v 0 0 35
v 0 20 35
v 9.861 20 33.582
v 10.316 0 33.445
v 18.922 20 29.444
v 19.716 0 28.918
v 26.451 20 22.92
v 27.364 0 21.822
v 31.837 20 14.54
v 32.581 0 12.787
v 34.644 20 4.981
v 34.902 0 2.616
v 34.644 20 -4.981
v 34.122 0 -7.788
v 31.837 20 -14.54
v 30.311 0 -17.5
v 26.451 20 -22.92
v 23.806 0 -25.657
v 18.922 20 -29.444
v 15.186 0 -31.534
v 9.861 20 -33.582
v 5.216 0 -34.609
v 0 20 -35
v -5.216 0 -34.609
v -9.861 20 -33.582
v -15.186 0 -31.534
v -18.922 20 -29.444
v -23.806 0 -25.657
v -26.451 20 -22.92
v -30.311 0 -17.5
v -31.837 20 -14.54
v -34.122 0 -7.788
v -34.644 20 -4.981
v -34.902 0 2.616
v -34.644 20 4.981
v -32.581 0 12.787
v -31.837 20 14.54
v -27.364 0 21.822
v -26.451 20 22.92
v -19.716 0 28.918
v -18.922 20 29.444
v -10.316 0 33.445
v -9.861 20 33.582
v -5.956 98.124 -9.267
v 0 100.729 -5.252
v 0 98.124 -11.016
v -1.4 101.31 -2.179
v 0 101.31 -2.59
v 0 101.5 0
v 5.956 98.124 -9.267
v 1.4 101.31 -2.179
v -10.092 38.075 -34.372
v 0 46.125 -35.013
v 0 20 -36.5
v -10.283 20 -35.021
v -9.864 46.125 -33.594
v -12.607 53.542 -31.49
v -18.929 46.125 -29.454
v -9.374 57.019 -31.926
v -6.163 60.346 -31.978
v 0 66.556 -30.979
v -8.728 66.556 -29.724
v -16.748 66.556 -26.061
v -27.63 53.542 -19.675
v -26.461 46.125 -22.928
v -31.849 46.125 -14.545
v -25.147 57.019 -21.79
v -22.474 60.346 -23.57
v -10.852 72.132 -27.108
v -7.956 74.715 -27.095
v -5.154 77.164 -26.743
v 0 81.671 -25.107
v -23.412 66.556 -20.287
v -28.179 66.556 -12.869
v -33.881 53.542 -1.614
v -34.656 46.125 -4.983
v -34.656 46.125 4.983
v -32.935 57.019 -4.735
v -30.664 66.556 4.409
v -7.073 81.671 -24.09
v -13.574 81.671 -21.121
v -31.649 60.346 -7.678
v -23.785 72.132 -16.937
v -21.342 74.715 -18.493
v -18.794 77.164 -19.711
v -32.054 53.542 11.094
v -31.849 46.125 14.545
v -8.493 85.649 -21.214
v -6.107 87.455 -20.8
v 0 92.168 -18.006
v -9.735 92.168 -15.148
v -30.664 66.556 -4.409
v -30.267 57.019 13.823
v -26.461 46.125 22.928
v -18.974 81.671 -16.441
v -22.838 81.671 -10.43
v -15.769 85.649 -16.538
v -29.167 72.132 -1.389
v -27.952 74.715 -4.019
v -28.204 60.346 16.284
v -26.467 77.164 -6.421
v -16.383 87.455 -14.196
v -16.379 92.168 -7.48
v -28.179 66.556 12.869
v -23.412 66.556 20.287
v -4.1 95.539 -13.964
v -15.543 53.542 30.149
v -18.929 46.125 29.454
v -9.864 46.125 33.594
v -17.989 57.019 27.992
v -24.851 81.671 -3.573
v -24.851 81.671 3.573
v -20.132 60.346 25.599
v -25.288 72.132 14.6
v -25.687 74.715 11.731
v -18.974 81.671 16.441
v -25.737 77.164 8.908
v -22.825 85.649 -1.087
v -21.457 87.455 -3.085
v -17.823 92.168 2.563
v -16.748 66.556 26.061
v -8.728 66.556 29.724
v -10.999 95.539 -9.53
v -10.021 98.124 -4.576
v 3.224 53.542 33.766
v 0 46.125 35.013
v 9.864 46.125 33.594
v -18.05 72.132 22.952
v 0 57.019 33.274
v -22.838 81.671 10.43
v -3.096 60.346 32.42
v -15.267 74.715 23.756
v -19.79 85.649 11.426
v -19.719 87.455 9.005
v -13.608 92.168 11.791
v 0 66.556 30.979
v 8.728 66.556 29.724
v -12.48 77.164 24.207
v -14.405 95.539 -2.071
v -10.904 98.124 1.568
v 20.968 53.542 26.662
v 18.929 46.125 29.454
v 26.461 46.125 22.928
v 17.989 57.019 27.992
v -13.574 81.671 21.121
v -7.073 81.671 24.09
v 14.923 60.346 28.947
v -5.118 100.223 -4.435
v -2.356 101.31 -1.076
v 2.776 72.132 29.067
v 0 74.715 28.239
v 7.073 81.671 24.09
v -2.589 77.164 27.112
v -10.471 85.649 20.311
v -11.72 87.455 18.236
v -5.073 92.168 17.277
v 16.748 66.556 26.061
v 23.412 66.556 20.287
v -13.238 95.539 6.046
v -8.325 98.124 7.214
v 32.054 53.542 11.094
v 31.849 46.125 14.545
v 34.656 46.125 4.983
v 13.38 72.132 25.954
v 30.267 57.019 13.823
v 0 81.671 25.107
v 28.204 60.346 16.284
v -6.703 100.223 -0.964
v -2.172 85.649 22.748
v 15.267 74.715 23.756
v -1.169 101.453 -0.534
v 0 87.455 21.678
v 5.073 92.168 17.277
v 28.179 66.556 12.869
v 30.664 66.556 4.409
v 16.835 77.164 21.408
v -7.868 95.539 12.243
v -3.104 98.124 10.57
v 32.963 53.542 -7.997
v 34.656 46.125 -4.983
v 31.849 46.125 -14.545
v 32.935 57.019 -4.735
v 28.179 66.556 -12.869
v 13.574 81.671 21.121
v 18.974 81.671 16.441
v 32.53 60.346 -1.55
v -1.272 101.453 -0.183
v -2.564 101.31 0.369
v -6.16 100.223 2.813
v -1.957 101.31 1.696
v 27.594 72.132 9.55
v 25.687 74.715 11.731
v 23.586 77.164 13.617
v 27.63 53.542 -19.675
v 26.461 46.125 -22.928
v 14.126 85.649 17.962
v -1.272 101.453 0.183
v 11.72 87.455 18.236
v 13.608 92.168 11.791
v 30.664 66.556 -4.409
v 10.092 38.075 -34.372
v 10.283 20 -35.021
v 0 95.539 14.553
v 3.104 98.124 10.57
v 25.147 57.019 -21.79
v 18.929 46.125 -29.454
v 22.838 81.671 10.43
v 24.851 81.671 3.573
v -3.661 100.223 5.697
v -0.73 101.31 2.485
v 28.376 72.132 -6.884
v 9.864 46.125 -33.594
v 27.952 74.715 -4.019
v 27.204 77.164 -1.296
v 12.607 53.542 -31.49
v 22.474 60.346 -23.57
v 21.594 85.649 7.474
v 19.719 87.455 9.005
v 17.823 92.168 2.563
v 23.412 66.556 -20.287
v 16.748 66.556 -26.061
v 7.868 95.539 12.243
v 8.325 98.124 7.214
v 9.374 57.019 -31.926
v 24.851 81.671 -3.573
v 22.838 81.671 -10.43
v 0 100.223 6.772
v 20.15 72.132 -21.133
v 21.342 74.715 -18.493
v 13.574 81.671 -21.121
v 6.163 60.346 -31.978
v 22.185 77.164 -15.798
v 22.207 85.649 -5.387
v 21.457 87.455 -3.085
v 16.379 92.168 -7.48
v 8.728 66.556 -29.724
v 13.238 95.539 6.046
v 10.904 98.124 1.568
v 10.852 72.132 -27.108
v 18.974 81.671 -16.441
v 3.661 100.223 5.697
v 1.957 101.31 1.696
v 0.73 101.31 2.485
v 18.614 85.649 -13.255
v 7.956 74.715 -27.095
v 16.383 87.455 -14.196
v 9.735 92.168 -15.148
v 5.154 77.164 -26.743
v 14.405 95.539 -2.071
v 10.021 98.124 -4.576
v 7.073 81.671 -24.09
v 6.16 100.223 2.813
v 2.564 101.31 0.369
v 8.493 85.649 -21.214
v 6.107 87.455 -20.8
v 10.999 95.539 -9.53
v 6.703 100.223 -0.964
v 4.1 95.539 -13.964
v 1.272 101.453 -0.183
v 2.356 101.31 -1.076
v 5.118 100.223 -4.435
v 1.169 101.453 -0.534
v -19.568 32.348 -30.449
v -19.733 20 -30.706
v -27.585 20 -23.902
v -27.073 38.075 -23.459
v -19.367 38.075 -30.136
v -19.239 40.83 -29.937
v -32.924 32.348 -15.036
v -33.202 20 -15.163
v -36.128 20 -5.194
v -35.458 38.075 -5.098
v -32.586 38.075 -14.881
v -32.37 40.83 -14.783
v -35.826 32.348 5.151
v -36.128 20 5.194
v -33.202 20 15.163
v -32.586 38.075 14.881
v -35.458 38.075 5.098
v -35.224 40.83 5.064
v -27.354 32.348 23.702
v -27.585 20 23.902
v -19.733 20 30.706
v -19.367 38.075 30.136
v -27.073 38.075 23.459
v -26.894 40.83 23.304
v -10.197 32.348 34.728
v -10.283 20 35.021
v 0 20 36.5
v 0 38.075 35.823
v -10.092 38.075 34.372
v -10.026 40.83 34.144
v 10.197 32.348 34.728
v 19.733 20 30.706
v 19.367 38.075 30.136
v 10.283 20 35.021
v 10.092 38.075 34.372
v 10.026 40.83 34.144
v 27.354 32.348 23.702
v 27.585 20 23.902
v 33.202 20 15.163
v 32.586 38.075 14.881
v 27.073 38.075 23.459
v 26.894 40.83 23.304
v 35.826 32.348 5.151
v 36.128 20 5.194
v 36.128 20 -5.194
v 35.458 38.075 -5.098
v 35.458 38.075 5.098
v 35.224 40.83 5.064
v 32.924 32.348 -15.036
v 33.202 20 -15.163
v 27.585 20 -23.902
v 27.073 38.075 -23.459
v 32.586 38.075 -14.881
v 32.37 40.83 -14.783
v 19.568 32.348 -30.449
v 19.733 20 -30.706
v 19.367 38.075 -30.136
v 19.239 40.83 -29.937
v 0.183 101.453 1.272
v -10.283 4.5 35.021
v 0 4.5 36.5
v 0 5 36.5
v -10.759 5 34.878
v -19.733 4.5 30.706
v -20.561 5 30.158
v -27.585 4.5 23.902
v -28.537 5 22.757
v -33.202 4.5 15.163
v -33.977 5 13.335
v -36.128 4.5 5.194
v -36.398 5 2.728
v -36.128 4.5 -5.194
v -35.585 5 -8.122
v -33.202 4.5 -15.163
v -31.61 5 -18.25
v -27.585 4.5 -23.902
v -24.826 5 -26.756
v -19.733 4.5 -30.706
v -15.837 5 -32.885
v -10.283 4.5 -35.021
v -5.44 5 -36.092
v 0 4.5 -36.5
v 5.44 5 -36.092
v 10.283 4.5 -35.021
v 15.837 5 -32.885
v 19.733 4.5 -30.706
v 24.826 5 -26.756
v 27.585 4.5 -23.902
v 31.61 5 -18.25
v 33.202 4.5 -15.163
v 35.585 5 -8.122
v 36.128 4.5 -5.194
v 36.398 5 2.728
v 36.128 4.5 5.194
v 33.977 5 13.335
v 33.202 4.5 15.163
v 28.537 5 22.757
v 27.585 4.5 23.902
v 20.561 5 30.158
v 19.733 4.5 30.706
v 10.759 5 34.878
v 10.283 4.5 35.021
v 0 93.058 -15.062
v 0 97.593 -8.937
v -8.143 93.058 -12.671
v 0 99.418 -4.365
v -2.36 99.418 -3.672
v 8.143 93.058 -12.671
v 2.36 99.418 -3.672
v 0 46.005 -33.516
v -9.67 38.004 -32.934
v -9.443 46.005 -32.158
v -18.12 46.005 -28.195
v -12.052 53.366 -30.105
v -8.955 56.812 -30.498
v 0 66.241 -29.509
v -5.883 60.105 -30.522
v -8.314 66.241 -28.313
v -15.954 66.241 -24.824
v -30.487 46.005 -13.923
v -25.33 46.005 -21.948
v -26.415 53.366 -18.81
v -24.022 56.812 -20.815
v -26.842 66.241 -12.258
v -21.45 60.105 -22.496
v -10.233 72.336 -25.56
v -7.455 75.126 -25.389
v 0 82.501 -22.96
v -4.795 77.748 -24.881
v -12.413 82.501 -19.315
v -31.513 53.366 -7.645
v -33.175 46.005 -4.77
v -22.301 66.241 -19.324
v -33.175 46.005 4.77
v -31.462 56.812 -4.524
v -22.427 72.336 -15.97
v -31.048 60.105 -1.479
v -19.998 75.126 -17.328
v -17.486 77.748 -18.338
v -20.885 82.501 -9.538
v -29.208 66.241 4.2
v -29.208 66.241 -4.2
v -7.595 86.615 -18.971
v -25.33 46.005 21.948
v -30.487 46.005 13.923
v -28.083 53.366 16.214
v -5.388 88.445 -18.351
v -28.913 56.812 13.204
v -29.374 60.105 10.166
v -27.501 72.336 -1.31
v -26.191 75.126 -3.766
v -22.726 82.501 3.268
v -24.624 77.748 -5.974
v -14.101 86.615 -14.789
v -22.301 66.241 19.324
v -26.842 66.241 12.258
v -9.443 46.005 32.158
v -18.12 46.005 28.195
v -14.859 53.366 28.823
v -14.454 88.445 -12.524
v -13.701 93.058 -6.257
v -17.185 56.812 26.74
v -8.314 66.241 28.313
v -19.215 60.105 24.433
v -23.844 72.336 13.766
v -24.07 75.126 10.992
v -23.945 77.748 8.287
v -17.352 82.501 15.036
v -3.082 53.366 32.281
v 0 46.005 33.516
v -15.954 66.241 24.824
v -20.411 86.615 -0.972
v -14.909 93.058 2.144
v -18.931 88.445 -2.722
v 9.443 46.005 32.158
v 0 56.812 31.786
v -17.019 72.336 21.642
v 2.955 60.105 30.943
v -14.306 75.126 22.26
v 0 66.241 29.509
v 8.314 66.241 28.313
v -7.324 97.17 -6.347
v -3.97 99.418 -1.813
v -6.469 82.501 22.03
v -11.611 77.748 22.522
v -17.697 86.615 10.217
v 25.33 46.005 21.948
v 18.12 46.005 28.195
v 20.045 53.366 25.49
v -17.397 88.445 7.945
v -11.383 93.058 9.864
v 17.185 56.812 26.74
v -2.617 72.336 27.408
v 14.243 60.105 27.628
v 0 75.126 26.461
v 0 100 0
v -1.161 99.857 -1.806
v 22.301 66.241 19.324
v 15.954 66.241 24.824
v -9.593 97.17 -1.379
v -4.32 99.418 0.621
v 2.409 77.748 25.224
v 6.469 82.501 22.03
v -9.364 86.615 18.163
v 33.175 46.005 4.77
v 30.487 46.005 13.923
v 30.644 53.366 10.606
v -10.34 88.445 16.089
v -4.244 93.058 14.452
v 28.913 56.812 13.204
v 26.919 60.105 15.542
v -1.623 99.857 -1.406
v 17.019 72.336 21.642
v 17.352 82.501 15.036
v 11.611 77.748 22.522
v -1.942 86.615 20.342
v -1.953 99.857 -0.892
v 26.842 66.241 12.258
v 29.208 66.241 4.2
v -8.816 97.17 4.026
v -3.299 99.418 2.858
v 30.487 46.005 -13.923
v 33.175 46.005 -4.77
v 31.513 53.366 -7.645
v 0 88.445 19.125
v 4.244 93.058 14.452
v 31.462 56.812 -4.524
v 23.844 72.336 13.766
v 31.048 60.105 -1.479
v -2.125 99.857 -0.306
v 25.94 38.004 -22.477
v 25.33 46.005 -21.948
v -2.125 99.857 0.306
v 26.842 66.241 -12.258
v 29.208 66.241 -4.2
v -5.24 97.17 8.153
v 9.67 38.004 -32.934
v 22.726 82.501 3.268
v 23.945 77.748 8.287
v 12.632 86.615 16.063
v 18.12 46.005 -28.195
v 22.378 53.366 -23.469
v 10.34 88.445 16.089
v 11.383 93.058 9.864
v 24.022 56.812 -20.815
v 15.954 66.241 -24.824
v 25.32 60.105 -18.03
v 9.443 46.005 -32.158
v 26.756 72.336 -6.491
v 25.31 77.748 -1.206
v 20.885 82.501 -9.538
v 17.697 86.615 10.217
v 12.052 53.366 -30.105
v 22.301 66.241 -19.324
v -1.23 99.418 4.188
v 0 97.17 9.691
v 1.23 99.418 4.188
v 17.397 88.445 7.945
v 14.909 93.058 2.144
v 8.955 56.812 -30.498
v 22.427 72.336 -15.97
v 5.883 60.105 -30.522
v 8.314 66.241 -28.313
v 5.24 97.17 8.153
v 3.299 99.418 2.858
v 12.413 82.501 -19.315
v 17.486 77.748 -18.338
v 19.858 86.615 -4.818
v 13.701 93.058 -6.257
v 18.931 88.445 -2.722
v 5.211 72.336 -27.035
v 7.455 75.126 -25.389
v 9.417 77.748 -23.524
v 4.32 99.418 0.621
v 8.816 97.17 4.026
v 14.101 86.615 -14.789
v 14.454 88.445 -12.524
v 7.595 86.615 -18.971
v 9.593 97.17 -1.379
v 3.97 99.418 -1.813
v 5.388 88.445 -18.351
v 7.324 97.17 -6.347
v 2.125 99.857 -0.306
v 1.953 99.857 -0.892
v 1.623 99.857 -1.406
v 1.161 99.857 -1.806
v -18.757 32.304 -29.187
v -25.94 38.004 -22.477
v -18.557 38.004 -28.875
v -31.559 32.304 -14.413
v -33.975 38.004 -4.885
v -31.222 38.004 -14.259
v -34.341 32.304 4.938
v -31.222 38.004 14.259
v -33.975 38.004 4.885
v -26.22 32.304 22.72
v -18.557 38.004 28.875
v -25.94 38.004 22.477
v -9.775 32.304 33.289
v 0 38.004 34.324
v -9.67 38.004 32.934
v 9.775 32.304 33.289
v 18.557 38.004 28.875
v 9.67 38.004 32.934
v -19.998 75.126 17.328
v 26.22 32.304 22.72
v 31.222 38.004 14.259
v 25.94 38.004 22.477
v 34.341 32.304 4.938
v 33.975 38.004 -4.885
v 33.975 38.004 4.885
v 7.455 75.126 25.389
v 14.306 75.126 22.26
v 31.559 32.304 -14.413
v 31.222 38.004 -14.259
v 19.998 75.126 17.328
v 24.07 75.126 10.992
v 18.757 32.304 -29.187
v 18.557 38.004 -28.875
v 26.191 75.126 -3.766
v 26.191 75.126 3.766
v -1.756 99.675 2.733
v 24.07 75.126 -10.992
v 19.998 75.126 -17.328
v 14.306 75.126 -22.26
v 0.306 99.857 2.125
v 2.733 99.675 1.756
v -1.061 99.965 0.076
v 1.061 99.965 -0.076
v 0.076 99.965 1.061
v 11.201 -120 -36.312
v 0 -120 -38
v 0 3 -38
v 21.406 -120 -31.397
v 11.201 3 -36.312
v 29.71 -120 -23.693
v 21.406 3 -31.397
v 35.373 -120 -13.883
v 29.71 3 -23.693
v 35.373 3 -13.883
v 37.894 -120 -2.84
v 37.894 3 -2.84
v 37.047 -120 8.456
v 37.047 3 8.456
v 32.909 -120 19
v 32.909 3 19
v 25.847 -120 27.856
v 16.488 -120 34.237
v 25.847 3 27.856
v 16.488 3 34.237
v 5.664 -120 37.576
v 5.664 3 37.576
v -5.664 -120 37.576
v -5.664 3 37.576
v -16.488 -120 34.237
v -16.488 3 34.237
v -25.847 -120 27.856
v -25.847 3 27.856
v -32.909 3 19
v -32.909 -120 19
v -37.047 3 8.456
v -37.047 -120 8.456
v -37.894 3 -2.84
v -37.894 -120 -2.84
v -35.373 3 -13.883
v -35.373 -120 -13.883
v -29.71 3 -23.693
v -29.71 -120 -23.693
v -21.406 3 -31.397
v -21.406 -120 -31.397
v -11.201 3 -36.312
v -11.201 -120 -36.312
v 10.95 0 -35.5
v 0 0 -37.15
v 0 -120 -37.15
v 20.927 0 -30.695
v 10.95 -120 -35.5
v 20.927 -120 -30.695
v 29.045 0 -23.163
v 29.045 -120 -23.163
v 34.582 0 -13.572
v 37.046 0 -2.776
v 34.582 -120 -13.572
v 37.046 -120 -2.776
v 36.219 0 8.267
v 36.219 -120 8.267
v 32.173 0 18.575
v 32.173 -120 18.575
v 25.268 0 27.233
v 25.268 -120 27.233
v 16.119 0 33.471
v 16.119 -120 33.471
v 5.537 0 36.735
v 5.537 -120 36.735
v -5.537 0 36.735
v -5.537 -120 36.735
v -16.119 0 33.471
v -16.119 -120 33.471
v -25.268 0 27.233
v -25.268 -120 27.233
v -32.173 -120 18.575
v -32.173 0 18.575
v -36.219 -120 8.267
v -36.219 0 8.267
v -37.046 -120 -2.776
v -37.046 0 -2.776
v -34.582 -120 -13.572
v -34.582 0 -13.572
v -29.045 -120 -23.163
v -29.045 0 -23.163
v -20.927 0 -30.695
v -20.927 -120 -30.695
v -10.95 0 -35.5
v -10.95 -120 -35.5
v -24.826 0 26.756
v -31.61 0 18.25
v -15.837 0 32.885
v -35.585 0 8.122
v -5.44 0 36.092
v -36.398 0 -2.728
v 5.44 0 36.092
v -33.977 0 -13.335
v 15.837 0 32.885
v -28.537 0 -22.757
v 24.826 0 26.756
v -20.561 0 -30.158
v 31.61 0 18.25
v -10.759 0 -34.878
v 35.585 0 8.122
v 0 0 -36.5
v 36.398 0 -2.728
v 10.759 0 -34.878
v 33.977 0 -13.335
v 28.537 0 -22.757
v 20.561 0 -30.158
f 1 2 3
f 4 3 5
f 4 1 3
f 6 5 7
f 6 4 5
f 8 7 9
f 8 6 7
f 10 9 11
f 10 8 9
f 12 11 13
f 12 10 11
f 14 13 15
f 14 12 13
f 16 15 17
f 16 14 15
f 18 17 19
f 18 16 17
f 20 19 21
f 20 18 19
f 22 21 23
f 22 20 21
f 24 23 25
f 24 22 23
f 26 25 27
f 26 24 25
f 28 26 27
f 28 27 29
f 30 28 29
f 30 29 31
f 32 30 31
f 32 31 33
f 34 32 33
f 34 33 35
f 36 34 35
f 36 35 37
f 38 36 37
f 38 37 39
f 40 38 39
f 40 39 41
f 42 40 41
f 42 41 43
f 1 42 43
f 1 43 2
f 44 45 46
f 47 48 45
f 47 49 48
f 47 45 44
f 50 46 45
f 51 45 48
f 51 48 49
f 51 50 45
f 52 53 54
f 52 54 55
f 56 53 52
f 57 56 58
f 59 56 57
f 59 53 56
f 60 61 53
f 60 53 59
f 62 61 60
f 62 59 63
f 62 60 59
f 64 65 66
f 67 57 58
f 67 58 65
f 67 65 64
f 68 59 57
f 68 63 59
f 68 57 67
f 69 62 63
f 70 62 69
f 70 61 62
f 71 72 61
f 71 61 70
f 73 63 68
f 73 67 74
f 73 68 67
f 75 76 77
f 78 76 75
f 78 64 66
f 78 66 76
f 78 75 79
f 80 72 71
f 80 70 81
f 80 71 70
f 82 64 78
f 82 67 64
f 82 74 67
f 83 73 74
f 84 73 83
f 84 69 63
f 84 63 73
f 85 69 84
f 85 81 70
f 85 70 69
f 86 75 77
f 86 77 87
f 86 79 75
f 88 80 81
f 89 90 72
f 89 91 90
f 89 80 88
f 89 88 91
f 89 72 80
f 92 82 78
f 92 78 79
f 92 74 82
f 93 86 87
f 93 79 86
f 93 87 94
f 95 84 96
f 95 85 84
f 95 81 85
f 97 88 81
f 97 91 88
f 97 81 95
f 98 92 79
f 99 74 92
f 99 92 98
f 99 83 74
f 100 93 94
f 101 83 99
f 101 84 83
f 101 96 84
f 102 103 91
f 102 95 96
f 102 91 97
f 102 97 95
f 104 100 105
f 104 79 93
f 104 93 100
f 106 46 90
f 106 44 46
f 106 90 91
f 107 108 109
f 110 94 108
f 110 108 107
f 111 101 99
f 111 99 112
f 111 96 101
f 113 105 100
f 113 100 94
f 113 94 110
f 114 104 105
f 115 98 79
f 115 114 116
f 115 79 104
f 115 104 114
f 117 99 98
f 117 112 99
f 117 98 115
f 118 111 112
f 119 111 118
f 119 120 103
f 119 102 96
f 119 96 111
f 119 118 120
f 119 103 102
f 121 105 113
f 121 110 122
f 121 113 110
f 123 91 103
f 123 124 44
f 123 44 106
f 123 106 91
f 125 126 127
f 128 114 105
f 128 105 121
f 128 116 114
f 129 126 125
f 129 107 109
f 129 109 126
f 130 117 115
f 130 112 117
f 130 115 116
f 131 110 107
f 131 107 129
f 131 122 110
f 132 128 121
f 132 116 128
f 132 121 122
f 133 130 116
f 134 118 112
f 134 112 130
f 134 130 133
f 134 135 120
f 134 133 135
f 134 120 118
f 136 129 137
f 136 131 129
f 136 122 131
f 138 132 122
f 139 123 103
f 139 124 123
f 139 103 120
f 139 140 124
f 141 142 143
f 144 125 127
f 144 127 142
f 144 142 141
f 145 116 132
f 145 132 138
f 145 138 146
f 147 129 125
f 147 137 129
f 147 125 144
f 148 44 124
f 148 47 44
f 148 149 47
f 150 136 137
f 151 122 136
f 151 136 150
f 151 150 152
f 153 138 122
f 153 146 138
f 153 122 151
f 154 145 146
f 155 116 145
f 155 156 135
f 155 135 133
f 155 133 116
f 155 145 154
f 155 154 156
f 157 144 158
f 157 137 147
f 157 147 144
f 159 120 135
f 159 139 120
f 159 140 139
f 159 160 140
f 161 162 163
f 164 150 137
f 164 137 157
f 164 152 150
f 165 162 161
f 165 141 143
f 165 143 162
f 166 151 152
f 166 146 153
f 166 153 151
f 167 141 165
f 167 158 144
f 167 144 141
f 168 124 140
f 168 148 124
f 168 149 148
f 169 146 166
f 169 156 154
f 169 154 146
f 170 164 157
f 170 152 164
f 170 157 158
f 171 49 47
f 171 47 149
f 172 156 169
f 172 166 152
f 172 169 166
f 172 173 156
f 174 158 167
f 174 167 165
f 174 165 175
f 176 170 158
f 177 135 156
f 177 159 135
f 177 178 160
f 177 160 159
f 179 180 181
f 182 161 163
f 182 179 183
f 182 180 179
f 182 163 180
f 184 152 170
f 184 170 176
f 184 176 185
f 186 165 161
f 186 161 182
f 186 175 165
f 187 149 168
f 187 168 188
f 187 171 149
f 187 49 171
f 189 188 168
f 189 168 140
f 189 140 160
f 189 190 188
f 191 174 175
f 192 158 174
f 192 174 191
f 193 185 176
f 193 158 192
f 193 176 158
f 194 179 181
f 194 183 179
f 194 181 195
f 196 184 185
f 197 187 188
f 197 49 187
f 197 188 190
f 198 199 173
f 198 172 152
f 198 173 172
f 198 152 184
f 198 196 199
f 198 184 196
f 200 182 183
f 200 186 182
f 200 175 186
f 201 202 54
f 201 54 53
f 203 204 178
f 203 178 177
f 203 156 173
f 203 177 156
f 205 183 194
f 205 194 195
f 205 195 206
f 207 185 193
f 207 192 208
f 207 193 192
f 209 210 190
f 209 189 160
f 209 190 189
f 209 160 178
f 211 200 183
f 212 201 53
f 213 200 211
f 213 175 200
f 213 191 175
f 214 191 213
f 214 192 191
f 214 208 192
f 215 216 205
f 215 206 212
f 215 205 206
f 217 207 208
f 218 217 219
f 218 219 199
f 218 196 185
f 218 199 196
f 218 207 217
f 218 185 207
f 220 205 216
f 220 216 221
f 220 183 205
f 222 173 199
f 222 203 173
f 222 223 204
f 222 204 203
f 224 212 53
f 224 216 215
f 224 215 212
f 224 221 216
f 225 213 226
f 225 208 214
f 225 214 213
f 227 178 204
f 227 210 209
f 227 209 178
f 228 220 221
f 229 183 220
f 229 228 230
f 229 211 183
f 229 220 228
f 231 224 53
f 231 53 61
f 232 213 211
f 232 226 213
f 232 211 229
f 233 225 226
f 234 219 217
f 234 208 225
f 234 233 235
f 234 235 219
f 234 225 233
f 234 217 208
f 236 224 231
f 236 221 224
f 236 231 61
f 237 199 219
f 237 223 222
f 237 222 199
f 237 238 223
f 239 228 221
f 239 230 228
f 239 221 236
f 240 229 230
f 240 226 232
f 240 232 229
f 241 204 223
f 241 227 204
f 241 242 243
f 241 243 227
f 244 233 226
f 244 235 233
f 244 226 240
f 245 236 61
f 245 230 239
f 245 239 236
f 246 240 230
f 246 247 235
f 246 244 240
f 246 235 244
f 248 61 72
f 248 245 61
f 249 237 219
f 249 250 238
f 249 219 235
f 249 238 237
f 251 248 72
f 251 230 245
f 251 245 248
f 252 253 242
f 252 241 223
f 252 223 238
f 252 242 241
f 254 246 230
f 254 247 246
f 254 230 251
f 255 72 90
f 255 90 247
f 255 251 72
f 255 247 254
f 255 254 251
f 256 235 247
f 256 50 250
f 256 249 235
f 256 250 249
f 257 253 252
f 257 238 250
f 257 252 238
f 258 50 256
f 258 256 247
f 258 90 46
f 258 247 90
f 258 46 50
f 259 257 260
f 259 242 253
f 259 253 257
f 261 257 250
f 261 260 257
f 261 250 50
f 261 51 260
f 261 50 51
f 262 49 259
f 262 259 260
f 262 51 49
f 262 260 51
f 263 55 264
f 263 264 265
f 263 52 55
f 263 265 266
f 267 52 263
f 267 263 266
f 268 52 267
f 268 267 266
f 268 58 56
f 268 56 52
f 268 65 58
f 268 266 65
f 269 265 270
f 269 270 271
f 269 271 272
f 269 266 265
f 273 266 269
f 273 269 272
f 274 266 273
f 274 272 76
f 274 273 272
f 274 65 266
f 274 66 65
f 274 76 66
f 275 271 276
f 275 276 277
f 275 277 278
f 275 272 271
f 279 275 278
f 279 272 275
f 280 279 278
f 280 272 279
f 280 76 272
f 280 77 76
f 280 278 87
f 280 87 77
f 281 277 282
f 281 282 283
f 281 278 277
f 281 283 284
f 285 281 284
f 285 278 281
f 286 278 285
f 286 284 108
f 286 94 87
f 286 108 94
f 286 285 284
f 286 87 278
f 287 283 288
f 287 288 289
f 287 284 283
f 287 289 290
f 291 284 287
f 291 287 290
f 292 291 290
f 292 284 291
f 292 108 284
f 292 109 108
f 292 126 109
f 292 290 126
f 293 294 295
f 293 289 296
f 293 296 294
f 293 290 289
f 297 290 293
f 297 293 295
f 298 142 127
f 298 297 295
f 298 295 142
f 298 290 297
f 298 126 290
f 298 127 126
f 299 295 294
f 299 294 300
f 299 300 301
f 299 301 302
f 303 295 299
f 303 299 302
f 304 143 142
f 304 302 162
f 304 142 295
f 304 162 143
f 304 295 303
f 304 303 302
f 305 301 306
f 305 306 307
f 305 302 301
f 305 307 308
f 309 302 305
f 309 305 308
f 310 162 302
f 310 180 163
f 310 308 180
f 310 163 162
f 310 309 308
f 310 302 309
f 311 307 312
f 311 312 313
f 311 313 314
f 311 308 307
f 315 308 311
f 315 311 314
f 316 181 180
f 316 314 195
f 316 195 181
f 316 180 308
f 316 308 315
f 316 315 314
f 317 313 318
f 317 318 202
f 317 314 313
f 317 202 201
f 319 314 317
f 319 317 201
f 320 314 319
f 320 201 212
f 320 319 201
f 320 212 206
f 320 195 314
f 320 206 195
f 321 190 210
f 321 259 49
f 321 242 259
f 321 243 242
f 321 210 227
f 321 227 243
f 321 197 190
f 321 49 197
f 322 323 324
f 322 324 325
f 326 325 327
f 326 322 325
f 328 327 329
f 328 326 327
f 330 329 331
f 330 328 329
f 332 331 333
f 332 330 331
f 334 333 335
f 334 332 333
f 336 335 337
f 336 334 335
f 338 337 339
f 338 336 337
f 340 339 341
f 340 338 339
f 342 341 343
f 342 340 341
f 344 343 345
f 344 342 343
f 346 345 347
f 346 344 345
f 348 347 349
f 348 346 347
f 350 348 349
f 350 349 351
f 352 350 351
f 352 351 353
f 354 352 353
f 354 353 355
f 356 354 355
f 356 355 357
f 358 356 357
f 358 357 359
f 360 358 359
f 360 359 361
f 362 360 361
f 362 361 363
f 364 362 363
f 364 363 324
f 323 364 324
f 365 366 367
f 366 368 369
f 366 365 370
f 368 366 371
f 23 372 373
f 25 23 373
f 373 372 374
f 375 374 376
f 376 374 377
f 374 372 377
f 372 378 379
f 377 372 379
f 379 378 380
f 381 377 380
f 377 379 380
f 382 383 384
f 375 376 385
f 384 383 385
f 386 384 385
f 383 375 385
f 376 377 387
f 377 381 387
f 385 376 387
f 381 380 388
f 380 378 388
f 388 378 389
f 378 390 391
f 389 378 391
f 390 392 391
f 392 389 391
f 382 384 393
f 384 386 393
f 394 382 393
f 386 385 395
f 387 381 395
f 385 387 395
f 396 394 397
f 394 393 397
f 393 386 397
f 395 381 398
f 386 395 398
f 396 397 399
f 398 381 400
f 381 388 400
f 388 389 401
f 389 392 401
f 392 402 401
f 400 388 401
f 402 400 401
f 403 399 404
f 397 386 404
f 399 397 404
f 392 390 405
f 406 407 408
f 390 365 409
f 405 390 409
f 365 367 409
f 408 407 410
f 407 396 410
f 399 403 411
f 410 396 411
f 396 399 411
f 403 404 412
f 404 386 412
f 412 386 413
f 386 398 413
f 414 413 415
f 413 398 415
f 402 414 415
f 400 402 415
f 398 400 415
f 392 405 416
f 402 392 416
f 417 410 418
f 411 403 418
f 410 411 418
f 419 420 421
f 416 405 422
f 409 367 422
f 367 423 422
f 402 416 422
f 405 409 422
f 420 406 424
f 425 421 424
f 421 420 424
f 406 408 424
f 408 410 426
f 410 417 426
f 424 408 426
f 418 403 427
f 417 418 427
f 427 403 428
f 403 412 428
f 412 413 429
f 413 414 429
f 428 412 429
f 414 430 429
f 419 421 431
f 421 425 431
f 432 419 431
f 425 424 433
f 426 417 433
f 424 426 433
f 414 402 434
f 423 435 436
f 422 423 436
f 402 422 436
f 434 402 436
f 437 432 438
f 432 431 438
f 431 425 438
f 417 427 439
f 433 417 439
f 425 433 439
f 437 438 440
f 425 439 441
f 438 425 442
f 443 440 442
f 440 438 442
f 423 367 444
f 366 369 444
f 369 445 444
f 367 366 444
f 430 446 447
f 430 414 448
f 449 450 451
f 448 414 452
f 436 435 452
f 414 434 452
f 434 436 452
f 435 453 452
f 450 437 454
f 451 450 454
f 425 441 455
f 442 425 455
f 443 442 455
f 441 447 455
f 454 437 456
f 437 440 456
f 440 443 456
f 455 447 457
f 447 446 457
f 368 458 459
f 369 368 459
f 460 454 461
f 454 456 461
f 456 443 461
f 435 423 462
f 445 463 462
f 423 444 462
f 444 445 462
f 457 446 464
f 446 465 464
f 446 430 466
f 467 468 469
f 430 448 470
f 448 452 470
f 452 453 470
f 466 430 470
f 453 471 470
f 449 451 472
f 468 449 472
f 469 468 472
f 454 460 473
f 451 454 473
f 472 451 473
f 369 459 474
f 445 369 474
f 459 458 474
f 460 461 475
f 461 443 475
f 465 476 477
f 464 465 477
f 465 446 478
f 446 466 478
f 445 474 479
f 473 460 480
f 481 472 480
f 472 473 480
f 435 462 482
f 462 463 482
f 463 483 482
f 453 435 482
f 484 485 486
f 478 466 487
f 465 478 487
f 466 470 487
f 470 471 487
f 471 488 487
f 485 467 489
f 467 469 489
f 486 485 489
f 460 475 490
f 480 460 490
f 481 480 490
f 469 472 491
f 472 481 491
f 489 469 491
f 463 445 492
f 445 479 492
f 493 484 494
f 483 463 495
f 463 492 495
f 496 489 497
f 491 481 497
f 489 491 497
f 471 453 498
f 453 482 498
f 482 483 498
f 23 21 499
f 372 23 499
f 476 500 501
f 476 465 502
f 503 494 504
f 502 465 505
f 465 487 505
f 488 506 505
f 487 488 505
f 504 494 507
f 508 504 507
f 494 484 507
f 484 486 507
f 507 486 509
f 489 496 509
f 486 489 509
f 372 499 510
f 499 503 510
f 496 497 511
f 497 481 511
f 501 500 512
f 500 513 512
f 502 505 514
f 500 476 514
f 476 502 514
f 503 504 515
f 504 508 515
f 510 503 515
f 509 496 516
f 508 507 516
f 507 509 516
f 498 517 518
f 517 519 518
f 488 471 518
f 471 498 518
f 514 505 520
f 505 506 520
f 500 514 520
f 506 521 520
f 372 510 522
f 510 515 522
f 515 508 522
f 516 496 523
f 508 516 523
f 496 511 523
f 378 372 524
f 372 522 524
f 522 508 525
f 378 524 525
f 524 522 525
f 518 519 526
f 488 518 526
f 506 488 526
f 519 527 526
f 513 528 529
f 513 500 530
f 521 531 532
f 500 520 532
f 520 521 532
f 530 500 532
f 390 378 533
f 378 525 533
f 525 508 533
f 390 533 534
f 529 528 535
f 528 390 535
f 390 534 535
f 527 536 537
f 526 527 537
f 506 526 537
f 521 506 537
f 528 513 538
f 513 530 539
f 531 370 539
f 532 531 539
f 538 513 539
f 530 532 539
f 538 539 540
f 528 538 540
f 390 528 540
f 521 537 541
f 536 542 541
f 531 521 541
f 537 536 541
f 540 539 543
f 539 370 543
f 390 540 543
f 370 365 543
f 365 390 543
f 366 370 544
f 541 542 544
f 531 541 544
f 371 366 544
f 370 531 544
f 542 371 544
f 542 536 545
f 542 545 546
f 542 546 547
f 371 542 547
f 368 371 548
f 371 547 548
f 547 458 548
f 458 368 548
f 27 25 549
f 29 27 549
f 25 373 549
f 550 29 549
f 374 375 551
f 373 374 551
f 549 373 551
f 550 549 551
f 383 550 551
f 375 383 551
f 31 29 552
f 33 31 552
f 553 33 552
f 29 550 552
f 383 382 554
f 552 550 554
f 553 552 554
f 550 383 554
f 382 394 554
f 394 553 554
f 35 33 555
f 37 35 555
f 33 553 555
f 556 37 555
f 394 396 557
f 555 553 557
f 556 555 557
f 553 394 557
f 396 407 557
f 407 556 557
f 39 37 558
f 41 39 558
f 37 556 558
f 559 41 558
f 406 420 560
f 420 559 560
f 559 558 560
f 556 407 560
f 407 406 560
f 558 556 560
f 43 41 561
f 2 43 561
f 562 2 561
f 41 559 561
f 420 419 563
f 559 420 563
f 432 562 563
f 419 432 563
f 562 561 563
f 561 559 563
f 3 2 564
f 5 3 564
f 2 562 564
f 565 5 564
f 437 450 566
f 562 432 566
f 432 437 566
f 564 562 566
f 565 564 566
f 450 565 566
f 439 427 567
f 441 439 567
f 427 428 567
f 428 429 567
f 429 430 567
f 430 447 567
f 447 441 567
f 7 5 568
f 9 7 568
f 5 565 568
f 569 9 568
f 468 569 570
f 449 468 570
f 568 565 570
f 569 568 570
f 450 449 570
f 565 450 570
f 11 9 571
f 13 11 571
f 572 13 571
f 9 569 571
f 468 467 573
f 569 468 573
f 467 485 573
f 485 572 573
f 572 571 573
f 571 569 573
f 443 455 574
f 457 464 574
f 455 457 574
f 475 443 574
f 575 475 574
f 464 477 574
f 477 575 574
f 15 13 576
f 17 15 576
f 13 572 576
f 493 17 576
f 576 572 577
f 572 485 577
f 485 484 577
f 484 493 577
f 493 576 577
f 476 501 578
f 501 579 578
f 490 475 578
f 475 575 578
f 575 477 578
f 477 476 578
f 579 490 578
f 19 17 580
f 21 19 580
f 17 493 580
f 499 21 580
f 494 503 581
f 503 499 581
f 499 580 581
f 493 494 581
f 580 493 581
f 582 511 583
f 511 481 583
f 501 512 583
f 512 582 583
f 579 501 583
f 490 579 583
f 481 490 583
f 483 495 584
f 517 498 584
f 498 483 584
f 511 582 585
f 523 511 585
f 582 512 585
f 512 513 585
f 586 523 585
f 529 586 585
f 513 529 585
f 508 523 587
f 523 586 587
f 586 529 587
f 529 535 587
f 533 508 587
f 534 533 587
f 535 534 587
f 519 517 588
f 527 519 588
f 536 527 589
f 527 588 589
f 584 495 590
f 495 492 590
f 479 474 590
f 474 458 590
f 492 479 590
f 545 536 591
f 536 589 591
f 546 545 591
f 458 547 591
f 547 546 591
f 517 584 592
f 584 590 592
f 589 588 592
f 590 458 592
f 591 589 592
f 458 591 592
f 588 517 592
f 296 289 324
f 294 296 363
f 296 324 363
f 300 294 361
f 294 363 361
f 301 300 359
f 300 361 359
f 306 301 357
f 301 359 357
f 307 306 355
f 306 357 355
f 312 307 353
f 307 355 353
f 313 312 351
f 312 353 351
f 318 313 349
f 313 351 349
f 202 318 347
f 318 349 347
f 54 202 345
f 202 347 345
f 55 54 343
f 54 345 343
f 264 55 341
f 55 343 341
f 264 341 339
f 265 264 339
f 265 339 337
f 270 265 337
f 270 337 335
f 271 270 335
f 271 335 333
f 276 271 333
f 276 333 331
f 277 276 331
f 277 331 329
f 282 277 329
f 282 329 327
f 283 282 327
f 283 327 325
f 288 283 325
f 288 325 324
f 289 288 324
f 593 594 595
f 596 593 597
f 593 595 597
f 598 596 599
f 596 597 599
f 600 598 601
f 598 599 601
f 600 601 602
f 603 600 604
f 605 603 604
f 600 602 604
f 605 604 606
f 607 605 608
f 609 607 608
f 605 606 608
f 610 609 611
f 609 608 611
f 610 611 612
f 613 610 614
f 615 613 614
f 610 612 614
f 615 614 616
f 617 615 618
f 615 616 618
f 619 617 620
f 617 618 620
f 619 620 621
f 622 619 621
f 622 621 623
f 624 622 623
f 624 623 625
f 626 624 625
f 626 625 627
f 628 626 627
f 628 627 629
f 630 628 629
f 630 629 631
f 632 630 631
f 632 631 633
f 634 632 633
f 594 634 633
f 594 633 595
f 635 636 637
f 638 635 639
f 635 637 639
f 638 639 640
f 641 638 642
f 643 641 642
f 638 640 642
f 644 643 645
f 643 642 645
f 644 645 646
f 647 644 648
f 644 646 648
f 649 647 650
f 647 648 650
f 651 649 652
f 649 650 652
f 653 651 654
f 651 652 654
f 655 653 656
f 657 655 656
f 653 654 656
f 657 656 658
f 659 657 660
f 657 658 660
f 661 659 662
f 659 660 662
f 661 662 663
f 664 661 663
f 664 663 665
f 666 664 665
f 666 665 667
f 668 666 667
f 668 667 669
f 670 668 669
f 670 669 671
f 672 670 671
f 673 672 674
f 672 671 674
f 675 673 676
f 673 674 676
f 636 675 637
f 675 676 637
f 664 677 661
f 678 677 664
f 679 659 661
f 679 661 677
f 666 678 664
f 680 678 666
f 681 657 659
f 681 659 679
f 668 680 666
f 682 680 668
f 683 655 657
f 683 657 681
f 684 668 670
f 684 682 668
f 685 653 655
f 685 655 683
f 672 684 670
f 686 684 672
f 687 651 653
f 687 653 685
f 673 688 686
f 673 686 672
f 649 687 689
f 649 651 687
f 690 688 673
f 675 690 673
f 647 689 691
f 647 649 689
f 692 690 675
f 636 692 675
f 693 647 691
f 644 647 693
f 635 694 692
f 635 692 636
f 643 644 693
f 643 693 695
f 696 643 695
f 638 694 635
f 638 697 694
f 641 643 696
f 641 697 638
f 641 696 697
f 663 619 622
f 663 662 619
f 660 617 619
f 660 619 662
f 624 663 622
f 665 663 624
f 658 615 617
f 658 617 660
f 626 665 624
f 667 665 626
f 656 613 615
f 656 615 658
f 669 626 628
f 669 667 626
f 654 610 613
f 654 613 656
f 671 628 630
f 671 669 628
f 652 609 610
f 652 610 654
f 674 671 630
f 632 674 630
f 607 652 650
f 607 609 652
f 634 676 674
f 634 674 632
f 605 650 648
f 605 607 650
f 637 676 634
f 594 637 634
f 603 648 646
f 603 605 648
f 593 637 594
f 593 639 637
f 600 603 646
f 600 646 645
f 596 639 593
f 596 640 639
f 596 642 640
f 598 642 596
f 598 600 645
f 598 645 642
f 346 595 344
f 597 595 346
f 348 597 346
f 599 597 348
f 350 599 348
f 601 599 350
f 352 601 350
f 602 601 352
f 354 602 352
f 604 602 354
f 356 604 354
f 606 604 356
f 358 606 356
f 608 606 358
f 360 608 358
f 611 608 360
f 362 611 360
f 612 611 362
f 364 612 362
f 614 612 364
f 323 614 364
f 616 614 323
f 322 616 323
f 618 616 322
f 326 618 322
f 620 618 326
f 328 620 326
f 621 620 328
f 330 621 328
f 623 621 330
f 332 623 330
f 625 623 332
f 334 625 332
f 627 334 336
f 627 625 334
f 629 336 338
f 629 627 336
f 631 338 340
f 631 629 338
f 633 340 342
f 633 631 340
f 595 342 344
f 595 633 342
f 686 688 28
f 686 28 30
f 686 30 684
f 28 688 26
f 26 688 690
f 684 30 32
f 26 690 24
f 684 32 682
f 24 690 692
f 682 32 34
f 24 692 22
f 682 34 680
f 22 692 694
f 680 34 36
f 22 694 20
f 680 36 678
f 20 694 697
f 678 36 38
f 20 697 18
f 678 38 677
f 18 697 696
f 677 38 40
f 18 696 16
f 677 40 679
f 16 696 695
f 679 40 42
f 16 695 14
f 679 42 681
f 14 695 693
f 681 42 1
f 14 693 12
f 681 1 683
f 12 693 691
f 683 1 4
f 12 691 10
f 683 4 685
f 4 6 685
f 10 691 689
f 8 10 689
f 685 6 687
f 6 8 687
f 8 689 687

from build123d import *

# Parameters (mm, degrees)
SKETCH1_R                = 36.5
SKETCH1_R_2              = 35
BOSS_EXTRUDE1_DEPTH      = 20
BOSS_EXTRUDE2_DEPTH      = 120
BOSS_EXTRUDE2_DEPTH_BACK = 5
SKETCH3_R                = 38
SKETCH3_R_2              = 36.5
CHAMFER1_SIZE            = 2
SKETCH4_R                = 37.15
CUT_EXTRUDE1_DEPTH       = 120


with BuildPart() as part:
    # Sketch1 → Boss-Extrude1 (new body)
    with BuildSketch(Plane(origin=(0, 0, 0), x_dir=(1, 0, 0), z_dir=(0, 1, 0))):
        with Locations(Location((0, 0, 0), (0, 0, 270))):
            Circle(SKETCH1_R)
        with Locations(Location((0, 0, 0), (0, 0, 270))):
            Circle(SKETCH1_R_2, mode=Mode.SUBTRACT)
    extrude(amount=BOSS_EXTRUDE1_DEPTH)

    # Sketch2 → Revolve1 (revolve)
    with BuildSketch(Plane.XY, mode=Mode.PRIVATE) as revolve1_sk:
        with BuildLine():
            Line((-35, 20), (-36.5, 20))
            add(Edge.make_bspline(
                [(-36.5, 20), (-36.5, 20.938203754), (-36.489872815, 22.828803886), (-36.429914329, 26.496139533), (-36.282028405, 30.946908345), (-35.992678983, 36.053561075), (-35.464097096, 42.564076378), (-34.547626097, 50.148542942), (-33.076762757, 58.396561812), (-31.272577792, 65.822093819), (-28.472409657, 74.667565146), (-24.325017143, 83.822828988), (-18.603719652, 92.00577673), (-13.454241979, 96.674123666), (-9.254678436, 99.216783088), (-6.104208908, 100.550031186), (-3.516650787, 101.201383216), (-1.484729716, 101.45792619), (-0.497779404, 101.5), (0, 101.5)],
                knots=[0, 0, 0, 0, 0.015625, 0.03125, 0.0625, 0.09375, 0.125, 0.1875, 0.25, 0.3125, 0.375, 0.5, 0.625, 0.75, 0.8125, 0.875, 0.9375, 0.96875, 1, 1, 1, 1], degree=3))
            Line((0, 101.5), (0, 100))
            add(Edge.make_bspline(
                [(-35, 20), (-35, 80.332266649), (-14.376326679, 100), (0, 100)],
                knots=[0, 0, 0, 0, 1, 1, 1, 1], degree=3))
        make_face()
    revolve(revolve1_sk.sketch.rotate(Axis((0, 20, 0), (0, 1, 0)), 270), axis=Axis((0, 20, 0), (0, 1, 0)))

    # Sketch3 → Boss-Extrude2 (add, two sides: drawn at the far end of the back side and taken through both)
    with BuildSketch(Plane.XZ.offset(-BOSS_EXTRUDE2_DEPTH_BACK)):
        with Locations(Location((0, 0, 0), (0, 0, 270))):
            Circle(SKETCH3_R)
        with Locations(Location((0, 0, 0), (0, 0, 270))):
            Circle(SKETCH3_R_2, mode=Mode.SUBTRACT)
    extrude(amount=BOSS_EXTRUDE2_DEPTH + BOSS_EXTRUDE2_DEPTH_BACK)

    # Chamfer1
    # the kernel refuses this chamfer: 2 mm, written as the material it takes off along each edge
    with BuildSketch(Plane(origin=(0, 5, 0), x_dir=(0, 0, -1), z_dir=(-1, 0, 0))) as chamfer1_piece_1_section:
        Polygon((38 - CHAMFER1_SIZE, 0), (38, CHAMFER1_SIZE), (38, 0), align=None)
    chamfer1_piece_1 = revolve(axis=Axis((0, 5, 0), (0, -1, 0)), mode=Mode.PRIVATE)
    chamfer1_piece_1 = chamfer1_piece_1 - Plane(origin=(0, 3.777023611, 0), x_dir=(0, 0, 1), z_dir=(0, -1, 0)) * Cylinder(36.5, 153, mode=Mode.PRIVATE)
    add(chamfer1_piece_1, mode=Mode.SUBTRACT)

    # Sketch4 → Cut-Extrude1 (cut)
    with BuildSketch(Plane.XZ.offset(120)):
        with Locations(Location((0, 0, 0), (0, 0, 270))):
            Circle(SKETCH4_R)
    extrude(amount=-CUT_EXTRUDE1_DEPTH, mode=Mode.SUBTRACT)


solid = part.part
